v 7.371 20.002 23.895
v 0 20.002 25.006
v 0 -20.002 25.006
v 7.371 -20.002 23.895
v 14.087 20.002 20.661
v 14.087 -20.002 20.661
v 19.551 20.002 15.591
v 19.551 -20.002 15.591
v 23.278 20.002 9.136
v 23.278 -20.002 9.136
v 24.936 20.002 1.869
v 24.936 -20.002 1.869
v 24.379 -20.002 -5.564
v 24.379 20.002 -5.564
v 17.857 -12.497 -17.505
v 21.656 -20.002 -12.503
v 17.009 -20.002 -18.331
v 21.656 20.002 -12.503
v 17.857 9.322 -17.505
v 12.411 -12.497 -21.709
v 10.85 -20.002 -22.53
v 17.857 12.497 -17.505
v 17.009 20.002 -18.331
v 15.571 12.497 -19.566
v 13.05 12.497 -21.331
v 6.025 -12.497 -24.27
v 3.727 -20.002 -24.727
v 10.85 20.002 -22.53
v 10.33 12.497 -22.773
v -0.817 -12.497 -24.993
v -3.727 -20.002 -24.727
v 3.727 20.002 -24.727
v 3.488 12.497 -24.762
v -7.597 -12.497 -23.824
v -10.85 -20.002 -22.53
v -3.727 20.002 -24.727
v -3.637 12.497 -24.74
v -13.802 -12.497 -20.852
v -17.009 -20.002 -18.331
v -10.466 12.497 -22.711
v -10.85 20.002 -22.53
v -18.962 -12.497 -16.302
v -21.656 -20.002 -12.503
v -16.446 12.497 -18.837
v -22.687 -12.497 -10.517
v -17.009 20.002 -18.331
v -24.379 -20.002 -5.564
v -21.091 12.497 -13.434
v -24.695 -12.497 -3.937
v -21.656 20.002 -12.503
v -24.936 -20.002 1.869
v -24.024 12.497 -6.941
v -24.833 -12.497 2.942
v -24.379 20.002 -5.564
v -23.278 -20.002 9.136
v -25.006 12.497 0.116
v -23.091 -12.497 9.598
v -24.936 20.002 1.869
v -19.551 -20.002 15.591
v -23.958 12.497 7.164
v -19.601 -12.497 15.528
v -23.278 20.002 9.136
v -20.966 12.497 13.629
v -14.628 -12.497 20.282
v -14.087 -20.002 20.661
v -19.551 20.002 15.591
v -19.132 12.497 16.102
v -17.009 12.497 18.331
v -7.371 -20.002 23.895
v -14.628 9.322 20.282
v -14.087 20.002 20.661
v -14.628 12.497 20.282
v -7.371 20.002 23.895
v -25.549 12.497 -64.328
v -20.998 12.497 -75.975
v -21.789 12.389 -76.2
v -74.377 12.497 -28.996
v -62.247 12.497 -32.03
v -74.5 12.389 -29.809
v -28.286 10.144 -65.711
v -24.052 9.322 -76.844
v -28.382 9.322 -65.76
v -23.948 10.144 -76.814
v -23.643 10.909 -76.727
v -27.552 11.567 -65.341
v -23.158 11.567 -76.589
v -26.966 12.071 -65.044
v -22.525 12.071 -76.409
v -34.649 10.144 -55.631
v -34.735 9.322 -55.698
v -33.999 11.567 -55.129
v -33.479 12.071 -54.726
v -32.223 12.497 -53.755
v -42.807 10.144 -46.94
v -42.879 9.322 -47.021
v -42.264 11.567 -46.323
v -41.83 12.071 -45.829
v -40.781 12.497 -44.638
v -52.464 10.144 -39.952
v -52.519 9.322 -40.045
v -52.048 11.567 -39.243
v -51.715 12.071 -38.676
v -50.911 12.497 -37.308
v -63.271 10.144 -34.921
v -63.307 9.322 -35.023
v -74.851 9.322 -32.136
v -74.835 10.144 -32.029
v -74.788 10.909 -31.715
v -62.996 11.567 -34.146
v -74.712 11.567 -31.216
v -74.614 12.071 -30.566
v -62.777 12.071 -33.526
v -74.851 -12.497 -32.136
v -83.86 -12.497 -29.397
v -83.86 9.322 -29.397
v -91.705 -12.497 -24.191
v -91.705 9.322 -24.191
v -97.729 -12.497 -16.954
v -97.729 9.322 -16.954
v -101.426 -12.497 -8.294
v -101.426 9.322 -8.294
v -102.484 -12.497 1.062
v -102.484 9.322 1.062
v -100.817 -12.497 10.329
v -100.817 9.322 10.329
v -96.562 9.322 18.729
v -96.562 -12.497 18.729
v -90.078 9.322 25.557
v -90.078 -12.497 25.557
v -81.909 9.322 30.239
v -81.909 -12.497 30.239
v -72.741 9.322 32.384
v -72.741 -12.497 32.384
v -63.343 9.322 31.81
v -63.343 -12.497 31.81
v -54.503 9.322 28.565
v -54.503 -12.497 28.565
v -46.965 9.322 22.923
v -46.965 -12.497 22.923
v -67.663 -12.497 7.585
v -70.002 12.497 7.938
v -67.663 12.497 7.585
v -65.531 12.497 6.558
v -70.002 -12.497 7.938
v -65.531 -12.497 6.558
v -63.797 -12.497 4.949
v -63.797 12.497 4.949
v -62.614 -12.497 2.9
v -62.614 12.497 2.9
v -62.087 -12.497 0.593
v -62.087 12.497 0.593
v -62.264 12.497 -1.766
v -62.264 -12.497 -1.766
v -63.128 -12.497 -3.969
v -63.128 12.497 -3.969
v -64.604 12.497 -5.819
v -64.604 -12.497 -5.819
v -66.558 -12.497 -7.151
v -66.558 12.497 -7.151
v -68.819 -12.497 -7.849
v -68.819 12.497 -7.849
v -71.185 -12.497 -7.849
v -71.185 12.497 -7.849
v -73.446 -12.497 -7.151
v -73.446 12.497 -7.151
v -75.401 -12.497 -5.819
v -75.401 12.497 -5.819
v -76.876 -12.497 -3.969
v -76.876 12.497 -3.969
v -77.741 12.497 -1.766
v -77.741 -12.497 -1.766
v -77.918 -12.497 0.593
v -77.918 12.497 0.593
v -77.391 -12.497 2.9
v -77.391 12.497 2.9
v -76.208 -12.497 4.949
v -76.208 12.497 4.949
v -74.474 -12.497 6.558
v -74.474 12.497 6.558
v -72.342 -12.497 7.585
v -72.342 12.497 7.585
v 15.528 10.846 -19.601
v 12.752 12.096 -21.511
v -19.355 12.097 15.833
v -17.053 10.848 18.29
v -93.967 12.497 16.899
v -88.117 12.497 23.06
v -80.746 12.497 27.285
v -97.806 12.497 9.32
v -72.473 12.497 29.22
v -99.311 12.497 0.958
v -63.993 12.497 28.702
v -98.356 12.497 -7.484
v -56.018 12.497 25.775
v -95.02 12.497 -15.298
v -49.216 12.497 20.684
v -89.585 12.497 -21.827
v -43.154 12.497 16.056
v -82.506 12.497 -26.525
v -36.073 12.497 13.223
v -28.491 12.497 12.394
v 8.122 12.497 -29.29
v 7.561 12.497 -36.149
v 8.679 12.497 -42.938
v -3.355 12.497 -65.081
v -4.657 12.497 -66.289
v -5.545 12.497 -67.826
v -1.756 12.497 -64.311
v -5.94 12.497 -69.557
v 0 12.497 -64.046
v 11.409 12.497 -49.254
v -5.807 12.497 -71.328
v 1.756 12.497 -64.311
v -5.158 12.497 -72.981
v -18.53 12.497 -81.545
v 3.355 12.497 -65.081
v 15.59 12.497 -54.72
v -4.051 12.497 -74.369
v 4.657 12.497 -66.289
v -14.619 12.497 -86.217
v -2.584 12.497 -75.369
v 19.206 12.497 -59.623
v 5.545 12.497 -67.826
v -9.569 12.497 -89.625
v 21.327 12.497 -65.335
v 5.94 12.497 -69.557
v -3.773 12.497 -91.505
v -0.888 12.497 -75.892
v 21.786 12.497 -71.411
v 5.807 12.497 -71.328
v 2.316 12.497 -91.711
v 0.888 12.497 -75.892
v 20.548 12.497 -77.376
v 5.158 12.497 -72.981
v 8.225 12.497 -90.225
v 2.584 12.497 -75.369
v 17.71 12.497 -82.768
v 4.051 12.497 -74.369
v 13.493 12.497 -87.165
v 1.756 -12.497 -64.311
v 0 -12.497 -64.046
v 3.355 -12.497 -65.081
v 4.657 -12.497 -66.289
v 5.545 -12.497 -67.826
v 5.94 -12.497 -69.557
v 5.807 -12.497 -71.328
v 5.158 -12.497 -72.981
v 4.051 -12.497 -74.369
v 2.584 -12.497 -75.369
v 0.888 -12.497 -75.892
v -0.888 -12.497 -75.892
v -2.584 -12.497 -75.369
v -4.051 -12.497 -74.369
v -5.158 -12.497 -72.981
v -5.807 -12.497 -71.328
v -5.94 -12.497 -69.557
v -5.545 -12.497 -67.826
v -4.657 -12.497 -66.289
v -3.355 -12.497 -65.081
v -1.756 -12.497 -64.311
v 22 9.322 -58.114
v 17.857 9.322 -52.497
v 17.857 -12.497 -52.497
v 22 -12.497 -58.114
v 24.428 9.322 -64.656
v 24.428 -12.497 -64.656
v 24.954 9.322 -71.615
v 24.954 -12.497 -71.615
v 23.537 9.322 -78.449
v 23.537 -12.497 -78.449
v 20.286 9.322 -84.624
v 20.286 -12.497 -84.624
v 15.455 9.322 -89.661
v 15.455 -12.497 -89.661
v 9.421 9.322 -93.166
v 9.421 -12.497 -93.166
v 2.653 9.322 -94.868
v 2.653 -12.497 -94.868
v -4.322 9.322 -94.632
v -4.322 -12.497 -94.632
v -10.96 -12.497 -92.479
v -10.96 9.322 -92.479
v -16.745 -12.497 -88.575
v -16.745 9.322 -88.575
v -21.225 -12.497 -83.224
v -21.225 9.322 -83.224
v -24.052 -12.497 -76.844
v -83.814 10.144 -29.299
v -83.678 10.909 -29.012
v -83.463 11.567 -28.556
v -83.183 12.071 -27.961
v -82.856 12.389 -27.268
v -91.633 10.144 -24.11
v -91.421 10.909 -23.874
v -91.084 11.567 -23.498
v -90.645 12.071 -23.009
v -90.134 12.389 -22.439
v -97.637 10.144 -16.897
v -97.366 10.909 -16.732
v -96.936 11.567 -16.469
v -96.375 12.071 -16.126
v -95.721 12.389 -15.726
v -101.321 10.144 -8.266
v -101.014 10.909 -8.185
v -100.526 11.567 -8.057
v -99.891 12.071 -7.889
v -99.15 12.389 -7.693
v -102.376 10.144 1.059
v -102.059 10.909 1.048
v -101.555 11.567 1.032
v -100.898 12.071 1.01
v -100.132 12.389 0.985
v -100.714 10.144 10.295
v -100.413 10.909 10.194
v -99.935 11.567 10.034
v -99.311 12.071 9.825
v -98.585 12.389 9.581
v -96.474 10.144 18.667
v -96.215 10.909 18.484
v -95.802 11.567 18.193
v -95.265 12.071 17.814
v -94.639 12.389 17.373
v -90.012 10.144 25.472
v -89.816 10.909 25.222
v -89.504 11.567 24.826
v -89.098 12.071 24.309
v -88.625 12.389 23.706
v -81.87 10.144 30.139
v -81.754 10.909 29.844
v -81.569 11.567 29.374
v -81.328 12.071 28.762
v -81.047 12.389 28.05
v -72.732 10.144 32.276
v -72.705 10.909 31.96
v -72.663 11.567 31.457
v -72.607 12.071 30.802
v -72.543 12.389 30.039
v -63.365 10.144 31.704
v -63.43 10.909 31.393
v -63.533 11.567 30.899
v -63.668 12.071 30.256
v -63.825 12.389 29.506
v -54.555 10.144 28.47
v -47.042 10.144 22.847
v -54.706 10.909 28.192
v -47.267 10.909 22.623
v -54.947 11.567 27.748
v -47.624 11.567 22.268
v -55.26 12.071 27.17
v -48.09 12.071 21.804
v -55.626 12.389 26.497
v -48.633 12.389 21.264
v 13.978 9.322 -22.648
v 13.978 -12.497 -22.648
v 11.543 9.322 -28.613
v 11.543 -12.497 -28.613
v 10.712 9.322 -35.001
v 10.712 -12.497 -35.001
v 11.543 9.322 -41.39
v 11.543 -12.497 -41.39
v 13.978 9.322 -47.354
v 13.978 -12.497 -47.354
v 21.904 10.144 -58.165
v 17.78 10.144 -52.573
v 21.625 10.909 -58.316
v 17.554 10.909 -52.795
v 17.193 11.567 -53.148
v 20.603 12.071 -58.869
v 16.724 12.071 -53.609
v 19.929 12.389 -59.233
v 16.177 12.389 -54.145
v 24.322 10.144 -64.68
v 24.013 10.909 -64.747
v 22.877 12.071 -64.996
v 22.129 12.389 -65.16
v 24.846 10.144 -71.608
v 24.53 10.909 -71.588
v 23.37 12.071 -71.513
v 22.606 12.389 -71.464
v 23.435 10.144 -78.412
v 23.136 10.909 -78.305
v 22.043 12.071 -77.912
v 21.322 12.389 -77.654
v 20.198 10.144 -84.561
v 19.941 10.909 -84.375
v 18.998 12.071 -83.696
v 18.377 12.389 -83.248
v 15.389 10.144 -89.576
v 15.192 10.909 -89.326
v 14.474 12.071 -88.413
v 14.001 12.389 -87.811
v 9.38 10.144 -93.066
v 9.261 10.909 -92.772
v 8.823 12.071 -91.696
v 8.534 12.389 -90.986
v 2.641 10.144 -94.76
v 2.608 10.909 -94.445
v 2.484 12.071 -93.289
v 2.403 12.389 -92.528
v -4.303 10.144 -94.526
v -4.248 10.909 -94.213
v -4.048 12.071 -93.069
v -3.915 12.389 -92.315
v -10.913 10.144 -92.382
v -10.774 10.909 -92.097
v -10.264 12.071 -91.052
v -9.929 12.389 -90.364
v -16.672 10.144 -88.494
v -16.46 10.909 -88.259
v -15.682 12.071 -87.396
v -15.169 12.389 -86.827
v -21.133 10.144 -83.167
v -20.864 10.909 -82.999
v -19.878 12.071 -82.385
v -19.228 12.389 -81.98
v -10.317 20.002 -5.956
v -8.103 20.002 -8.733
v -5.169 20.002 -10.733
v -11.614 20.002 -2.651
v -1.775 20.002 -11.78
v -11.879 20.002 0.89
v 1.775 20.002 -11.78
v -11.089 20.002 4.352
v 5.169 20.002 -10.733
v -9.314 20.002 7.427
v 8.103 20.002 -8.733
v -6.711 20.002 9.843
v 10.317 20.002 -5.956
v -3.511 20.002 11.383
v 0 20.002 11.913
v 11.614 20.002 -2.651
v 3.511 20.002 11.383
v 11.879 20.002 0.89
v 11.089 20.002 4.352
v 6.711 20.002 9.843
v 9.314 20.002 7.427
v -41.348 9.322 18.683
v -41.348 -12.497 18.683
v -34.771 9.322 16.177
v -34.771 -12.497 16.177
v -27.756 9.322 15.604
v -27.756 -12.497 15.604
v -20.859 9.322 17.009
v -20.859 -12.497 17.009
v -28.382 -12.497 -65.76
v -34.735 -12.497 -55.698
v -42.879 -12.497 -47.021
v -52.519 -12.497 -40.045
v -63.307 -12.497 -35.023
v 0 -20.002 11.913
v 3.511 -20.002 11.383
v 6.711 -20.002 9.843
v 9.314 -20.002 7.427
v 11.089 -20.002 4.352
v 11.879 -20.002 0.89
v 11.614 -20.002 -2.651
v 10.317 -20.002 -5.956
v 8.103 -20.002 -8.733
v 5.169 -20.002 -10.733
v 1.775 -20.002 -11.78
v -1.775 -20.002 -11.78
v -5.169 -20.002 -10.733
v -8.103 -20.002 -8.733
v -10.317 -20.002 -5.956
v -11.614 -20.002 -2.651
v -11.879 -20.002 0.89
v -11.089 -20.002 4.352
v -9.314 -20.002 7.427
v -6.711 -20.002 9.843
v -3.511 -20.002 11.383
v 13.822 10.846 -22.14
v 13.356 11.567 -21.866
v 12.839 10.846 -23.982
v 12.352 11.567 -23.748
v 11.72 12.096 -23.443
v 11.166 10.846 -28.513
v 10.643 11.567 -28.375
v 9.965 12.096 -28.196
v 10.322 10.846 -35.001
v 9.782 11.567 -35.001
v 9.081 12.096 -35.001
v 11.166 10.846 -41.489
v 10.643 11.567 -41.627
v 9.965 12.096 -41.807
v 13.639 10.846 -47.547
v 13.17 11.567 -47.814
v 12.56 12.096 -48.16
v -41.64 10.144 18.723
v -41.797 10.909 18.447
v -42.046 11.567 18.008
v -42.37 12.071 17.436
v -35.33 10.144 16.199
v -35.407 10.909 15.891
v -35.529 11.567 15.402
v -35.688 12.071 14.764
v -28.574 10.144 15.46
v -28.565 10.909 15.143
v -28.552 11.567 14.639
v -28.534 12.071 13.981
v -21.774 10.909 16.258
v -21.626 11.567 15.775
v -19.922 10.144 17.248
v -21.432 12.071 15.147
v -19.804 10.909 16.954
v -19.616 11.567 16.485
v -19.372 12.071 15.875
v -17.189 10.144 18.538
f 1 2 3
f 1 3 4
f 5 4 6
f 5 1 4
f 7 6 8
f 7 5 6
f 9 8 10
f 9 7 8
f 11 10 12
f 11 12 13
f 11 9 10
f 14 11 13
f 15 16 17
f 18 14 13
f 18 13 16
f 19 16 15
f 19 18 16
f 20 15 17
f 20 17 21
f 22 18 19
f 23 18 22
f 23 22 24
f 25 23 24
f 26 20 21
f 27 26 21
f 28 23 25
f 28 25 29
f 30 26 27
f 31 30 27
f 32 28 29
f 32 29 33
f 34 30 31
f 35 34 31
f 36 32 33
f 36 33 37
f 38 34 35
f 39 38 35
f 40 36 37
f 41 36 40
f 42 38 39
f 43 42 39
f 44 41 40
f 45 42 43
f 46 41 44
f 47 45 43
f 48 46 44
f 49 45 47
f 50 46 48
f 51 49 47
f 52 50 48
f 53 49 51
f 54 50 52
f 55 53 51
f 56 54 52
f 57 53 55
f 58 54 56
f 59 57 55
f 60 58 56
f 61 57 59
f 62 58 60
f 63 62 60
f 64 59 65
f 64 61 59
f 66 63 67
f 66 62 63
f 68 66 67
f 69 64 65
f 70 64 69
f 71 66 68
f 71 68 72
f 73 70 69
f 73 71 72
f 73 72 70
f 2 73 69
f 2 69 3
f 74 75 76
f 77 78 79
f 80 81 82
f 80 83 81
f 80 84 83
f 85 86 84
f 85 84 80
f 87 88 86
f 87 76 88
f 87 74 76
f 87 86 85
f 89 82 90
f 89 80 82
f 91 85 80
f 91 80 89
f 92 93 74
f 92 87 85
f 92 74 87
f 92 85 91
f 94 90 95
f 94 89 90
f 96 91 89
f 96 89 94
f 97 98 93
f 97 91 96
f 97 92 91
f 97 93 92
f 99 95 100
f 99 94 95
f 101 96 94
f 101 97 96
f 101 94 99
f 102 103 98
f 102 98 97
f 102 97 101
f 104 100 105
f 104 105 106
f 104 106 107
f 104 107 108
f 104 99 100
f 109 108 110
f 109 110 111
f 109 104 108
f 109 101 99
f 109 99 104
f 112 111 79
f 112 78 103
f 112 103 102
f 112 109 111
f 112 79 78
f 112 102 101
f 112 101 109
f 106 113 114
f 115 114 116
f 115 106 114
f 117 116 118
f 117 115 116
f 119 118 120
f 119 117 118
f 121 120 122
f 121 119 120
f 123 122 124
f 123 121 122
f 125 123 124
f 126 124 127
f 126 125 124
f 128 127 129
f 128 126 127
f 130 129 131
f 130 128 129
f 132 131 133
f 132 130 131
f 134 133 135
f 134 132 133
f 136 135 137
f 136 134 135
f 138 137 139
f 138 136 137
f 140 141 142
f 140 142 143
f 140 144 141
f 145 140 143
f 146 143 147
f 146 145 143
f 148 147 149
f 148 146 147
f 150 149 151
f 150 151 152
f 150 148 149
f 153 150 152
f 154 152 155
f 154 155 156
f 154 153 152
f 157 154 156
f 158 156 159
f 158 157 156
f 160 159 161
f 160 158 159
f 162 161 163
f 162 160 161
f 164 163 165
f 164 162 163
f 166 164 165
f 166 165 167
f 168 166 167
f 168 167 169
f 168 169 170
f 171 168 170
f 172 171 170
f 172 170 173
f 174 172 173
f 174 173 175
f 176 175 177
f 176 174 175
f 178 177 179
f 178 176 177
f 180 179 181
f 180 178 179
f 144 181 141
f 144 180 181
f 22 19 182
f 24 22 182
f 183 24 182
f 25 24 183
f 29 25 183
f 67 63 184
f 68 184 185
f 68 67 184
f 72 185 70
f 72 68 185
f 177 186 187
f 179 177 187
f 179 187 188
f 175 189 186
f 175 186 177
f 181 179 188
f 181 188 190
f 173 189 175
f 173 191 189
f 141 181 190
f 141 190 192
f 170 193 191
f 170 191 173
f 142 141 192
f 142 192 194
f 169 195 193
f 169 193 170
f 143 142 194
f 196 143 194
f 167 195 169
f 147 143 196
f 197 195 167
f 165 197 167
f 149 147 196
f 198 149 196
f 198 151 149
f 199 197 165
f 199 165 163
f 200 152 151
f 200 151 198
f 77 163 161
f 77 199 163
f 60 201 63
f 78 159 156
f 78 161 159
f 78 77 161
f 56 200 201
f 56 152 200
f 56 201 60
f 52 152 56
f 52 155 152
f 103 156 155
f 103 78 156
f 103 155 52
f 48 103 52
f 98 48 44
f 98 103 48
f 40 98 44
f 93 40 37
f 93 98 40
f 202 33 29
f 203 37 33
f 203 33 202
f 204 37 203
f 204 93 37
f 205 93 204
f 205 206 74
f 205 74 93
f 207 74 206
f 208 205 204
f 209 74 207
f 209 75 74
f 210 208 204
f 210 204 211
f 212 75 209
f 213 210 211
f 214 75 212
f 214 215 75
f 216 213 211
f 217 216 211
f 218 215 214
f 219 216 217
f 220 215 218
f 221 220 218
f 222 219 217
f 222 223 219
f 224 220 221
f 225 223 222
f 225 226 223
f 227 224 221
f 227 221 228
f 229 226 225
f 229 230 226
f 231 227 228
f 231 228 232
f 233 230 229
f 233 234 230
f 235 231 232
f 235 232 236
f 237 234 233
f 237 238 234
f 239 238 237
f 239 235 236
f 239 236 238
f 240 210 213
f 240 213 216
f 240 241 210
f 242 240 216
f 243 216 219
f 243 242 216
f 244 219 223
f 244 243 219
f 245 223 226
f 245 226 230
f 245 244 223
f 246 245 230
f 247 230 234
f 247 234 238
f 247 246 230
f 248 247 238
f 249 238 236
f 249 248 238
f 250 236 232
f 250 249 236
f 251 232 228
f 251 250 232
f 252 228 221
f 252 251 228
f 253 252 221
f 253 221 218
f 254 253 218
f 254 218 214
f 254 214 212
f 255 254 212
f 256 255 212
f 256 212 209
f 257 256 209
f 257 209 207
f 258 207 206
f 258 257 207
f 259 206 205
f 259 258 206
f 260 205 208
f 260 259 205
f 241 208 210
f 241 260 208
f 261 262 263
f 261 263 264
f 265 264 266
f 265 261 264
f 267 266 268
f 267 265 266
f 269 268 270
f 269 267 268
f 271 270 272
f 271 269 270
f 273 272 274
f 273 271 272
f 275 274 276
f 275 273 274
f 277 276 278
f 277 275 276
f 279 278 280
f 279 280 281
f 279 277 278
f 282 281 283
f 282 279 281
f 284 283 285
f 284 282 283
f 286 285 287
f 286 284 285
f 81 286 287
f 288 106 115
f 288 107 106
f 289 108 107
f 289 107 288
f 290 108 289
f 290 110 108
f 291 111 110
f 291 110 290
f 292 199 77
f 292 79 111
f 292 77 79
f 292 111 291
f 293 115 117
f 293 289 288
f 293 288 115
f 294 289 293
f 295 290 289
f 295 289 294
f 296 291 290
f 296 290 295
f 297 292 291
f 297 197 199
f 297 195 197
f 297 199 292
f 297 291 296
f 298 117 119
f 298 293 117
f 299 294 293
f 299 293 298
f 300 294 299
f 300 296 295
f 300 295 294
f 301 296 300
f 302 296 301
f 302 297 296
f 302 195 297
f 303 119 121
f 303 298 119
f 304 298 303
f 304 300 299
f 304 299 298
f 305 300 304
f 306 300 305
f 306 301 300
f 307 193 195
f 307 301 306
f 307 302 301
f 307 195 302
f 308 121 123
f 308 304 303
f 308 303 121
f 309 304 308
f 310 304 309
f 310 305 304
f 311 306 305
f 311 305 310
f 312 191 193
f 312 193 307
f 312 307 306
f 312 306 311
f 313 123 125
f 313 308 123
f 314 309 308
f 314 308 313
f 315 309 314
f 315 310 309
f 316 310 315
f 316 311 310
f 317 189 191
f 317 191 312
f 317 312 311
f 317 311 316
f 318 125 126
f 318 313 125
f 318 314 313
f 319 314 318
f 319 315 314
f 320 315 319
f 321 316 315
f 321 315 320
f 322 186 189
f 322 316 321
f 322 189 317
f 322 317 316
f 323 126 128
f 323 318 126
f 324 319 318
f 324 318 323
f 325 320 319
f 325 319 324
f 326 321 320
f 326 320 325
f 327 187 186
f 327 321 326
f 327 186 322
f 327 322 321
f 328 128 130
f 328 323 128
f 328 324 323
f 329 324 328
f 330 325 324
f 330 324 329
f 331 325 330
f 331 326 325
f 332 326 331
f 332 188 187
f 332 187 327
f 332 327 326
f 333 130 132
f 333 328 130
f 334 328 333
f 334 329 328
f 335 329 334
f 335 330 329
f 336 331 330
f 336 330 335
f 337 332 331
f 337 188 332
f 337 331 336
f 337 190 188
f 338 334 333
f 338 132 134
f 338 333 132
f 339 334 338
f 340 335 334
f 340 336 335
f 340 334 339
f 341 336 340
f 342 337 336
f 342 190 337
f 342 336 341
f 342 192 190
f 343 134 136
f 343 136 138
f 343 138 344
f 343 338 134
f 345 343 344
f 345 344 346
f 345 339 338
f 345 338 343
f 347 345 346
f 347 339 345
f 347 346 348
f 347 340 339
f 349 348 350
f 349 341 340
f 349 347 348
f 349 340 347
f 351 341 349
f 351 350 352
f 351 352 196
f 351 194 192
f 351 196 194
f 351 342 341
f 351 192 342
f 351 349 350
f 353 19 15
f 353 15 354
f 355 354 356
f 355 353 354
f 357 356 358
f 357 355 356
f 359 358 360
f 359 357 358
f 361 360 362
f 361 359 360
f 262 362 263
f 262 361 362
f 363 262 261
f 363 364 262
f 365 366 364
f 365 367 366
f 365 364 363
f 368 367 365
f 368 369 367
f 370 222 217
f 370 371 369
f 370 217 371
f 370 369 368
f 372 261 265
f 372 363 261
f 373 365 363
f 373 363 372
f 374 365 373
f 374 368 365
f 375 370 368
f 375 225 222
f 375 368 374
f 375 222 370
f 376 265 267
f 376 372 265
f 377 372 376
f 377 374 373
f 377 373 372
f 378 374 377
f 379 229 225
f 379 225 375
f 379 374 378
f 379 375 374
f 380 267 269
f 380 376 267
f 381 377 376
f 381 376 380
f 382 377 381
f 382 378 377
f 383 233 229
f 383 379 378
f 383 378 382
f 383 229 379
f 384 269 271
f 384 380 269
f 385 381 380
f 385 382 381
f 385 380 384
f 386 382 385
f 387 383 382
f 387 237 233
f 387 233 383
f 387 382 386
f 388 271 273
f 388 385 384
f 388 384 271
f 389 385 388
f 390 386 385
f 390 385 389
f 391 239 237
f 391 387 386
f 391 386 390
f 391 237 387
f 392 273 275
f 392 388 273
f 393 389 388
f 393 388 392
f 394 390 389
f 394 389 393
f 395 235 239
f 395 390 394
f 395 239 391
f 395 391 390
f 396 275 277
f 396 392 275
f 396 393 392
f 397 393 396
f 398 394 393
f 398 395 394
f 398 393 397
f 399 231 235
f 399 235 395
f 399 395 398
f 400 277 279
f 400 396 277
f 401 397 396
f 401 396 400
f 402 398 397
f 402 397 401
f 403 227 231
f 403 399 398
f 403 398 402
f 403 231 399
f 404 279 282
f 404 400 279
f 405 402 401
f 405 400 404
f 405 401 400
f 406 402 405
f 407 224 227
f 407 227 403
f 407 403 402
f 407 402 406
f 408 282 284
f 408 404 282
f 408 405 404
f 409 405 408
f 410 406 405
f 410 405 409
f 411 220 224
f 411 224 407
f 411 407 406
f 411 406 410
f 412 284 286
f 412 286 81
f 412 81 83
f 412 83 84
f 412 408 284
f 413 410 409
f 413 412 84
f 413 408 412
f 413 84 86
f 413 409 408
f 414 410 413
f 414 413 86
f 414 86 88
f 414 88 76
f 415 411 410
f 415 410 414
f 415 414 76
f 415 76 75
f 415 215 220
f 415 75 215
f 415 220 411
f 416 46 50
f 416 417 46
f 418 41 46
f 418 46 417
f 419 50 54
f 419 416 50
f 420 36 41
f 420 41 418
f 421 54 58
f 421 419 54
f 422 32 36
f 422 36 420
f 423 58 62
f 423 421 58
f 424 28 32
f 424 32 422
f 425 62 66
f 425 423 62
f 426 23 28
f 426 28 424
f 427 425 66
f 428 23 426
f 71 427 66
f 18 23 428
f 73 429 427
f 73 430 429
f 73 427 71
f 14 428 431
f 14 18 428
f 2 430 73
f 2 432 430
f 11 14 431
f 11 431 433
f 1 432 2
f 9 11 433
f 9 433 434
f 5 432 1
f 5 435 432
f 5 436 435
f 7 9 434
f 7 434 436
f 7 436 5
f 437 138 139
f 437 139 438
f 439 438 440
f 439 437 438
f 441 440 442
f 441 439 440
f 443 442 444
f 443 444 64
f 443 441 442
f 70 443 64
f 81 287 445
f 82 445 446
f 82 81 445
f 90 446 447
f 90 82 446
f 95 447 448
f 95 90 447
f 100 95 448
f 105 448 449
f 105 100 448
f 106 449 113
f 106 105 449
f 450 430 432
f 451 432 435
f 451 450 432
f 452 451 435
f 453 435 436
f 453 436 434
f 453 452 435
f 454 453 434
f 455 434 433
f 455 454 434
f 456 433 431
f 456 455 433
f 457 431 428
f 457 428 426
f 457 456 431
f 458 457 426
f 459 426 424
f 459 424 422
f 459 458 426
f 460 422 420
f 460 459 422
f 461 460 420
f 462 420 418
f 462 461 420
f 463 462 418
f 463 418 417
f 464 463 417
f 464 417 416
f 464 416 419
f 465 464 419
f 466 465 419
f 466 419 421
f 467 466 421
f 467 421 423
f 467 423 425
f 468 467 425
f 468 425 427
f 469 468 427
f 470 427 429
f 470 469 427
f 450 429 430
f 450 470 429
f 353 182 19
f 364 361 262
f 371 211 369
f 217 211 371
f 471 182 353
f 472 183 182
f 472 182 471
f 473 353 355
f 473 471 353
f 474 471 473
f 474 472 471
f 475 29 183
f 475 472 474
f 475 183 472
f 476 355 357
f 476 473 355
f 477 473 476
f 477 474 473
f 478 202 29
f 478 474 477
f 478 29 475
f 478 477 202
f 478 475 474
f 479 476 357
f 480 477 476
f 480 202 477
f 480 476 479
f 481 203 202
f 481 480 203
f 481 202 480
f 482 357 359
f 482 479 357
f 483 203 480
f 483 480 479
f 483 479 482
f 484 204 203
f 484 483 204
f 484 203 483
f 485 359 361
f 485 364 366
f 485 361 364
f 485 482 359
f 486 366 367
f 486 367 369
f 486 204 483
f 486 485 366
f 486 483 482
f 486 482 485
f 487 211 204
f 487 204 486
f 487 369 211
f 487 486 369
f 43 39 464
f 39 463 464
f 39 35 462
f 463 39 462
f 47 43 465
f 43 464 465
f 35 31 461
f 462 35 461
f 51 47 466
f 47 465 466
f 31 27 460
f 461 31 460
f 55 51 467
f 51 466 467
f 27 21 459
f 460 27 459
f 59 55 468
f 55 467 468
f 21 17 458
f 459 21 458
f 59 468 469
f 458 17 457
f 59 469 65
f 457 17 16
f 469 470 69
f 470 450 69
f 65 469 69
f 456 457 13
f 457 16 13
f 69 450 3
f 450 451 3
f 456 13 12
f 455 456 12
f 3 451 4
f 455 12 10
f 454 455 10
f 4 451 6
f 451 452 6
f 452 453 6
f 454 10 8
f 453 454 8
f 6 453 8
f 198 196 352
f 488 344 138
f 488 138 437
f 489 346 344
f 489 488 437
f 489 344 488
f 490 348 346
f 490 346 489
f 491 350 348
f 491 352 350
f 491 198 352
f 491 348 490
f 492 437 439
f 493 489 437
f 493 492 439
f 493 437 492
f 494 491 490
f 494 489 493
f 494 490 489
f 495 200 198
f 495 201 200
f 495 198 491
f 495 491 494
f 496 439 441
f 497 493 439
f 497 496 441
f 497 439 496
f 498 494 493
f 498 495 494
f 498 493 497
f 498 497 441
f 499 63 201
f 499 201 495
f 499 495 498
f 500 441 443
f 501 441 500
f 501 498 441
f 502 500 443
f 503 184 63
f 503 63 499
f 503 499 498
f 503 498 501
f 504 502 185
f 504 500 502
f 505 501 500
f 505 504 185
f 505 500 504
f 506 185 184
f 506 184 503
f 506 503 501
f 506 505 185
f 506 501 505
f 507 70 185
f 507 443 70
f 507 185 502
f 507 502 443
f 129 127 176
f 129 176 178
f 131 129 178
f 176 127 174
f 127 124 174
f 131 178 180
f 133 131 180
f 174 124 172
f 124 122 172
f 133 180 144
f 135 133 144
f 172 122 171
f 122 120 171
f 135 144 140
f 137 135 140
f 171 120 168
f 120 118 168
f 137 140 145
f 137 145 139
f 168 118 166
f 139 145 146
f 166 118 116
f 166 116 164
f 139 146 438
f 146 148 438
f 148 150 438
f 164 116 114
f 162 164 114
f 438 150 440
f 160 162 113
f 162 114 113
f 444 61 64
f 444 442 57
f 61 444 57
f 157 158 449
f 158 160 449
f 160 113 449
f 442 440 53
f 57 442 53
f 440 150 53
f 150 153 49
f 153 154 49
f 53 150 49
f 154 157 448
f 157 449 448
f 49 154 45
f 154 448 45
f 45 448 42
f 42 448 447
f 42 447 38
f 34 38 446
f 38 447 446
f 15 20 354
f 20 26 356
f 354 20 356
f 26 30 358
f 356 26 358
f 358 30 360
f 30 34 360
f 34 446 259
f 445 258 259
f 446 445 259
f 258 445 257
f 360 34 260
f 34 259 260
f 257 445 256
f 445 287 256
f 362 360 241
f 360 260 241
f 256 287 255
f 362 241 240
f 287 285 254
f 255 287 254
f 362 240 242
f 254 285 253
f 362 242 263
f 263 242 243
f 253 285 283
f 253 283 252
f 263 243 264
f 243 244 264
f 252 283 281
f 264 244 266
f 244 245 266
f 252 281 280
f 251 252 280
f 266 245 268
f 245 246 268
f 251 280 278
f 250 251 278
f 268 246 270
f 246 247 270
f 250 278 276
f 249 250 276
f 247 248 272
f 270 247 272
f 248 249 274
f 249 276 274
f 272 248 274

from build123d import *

# Parameters (mm, degrees)
SKETCH2_R           = 25.0063
SKETCH2_R_2         = 11.9126
BOSS_EXTRUDE2_DEPTH = 20.0025
SKETCH2_3_R         = 7.9375
SKETCH2_3_R_2       = 5.9563
BOSS_EXTRUDE3_DEPTH = 12.4968
FILLET1_R           = 3.175


with BuildPart() as part:
    # Sketch2 → Boss-Extrude2 (new, symmetric)
    with BuildSketch(Plane(origin=(0, 0, 0), x_dir=(1, 0, 0), z_dir=(0, 1, 0))):
        with Locations(Location((0, 0, 0), (0, 0, 270))):
            Circle(SKETCH2_R)
        with Locations(Location((0, 0, 0), (0, 0, 270))):
            Circle(SKETCH2_R_2, mode=Mode.SUBTRACT)
    extrude(amount=BOSS_EXTRUDE2_DEPTH, both=True)

    # Sketch2<3> → Boss-Extrude3 (add, symmetric)
    with BuildSketch(Plane(origin=(0, 0, 0), x_dir=(1, 0, 0), z_dir=(0, 1, 0))):
        with BuildLine():
            ThreePointArc((-14.627829046, -20.281559533), (-18.962185595, 16.301857476), (17.857447567, 17.505045161))
            ThreePointArc((17.857447567, 17.505045161), (10.712225835, 35.0012), (17.857447567, 52.497354839))
            ThreePointArc((17.857447567, 52.497354839), (12.561079617, 91.624941907), (-24.05225317, 76.843756383))
            ThreePointArc((-24.05225317, 76.843756383), (-42.87857023, 47.021182923), (-74.850980968, 32.135584063))
            ThreePointArc((-74.850980968, 32.135584063), (-98.995210512, -14.684053906), (-46.965085328, -22.923495222))
            ThreePointArc((-46.965085328, -22.923495222), (-31.283411202, -15.642216981), (-14.627829046, -20.281559533))
        make_face()
        with Locations(Location((-70.0024, 0, 0), (0, 0, 270))):
            Circle(SKETCH2_3_R, mode=Mode.SUBTRACT)
        with Locations(Location((0, 70.0024, 0), (0, 0, 270))):
            Circle(SKETCH2_3_R_2, mode=Mode.SUBTRACT)
    extrude(amount=BOSS_EXTRUDE3_DEPTH, both=True)

    # Fillet1
    # the kernel refuses this fillet: 3.175 mm, written as the material it takes off along each edge
    with BuildSketch(Plane(origin=(-84.17677836, 12.4968, -93.945410073), x_dir=(0.9618477411525731, 0, 0.2735853118127743), z_dir=(0.2735853118127743, 0, -0.9618477411525731))) as fillet1_piece_1:
        with BuildLine():
            CenterArc((62.5094 + FILLET1_R, FILLET1_R), FILLET1_R, 180, 90)
            Line((62.5094, FILLET1_R), (62.5094, 0))
            Line((62.5094, 0), (62.5094 + FILLET1_R, 0))
        make_face()
    revolve(axis=Axis((-84.17677836, 12.4968, -93.945410073), (0, -1, 0)), revolution_arc=65.542266938, mode=Mode.SUBTRACT)
    with BuildSketch(Plane(origin=(-29.248229028, 12.4968, 40.552818629), x_dir=(-0.7088557190961631, 0, -0.705353506764276), z_dir=(-0.705353506764276, 0, 0.7088557190961631))) as fillet1_piece_2_section:
        with BuildLine():
            CenterArc((24.9936 + FILLET1_R, FILLET1_R), FILLET1_R, 180, 90)
            Line((24.9936 + FILLET1_R, 0), (24.9936, 0))
            Line((24.9936, 0), (24.9936, FILLET1_R))
        make_face()
    fillet1_piece_2 = revolve(axis=Axis((-29.248229028, 12.4968, 40.552818629), (0, -1, 0)), revolution_arc=99.144440238, mode=Mode.PRIVATE)
    fillet1_piece_2 = fillet1_piece_2 - Plane(origin=(0, 11.594758581, 0), x_dir=(0, 0, 1), z_dir=(0, 1, 0)) * Cylinder(25.0063, 113, mode=Mode.PRIVATE)
    add(fillet1_piece_2, mode=Mode.SUBTRACT)
    with BuildSketch(Plane(origin=(35.705825835, 12.4968, -35.0012), x_dir=(-0.45970021745025064, 0, 0.8880741579824245), z_dir=(0.8880741579824245, 0, 0.45970021745025064))) as fillet1_piece_3_section:
        with BuildLine():
            CenterArc((24.9936 + FILLET1_R, FILLET1_R), FILLET1_R, 180, 90)
            Line((24.9936, FILLET1_R), (24.9936, 0))
            Line((24.9936, 0), (24.9936 + FILLET1_R, 0))
        make_face()
    fillet1_piece_3 = revolve(axis=Axis((35.705825835, 12.4968, -35.0012), (0, -1, 0)), revolution_arc=107.06127711, mode=Mode.PRIVATE)
    fillet1_piece_3 = fillet1_piece_3 - Plane(origin=(0, 11.595953035, 0), x_dir=(0, 0, 1), z_dir=(0, 1, 0)) * Cylinder(25.0063, 113, mode=Mode.PRIVATE)
    add(fillet1_piece_3, mode=Mode.SUBTRACT)
    with BuildSketch(Plane(origin=(-70.0024, 12.4968, 0), x_dir=(-0.1491903200484399, 0, -0.9888084993586191), z_dir=(0.9888084993586191, 0, -0.1491903200484399))) as fillet1_piece_4:
        with BuildLine():
            CenterArc((32.4993 - FILLET1_R, -FILLET1_R), FILLET1_R, 0, 90)
            Line((32.4993, -FILLET1_R), (32.4993, 0))
            Line((32.4993, 0), (32.4993 - FILLET1_R, 0))
        make_face()
    revolve(axis=Axis((-70.0024, 12.4968, 0), (0, 1, 0)), revolution_arc=216.561882249, mode=Mode.SUBTRACT)
    with BuildSketch(Plane(origin=(0, 12.4968, -70.0024), x_dir=(0.7141179449388714, 0, 0.7000254000508005), z_dir=(-0.7000254000508005, 0, 0.7141179449388714))) as fillet1_piece_5:
        with BuildLine():
            CenterArc((25.0063 - FILLET1_R, -FILLET1_R), FILLET1_R, 0, 90)
            Line((25.0063, -FILLET1_R), (25.0063, 0))
            Line((25.0063, 0), (25.0063 - FILLET1_R, 0))
        make_face()
    revolve(axis=Axis((0, 12.4968, -70.0024), (0, 1, 0)), revolution_arc=208.551316171, mode=Mode.SUBTRACT)


solid = part.part
